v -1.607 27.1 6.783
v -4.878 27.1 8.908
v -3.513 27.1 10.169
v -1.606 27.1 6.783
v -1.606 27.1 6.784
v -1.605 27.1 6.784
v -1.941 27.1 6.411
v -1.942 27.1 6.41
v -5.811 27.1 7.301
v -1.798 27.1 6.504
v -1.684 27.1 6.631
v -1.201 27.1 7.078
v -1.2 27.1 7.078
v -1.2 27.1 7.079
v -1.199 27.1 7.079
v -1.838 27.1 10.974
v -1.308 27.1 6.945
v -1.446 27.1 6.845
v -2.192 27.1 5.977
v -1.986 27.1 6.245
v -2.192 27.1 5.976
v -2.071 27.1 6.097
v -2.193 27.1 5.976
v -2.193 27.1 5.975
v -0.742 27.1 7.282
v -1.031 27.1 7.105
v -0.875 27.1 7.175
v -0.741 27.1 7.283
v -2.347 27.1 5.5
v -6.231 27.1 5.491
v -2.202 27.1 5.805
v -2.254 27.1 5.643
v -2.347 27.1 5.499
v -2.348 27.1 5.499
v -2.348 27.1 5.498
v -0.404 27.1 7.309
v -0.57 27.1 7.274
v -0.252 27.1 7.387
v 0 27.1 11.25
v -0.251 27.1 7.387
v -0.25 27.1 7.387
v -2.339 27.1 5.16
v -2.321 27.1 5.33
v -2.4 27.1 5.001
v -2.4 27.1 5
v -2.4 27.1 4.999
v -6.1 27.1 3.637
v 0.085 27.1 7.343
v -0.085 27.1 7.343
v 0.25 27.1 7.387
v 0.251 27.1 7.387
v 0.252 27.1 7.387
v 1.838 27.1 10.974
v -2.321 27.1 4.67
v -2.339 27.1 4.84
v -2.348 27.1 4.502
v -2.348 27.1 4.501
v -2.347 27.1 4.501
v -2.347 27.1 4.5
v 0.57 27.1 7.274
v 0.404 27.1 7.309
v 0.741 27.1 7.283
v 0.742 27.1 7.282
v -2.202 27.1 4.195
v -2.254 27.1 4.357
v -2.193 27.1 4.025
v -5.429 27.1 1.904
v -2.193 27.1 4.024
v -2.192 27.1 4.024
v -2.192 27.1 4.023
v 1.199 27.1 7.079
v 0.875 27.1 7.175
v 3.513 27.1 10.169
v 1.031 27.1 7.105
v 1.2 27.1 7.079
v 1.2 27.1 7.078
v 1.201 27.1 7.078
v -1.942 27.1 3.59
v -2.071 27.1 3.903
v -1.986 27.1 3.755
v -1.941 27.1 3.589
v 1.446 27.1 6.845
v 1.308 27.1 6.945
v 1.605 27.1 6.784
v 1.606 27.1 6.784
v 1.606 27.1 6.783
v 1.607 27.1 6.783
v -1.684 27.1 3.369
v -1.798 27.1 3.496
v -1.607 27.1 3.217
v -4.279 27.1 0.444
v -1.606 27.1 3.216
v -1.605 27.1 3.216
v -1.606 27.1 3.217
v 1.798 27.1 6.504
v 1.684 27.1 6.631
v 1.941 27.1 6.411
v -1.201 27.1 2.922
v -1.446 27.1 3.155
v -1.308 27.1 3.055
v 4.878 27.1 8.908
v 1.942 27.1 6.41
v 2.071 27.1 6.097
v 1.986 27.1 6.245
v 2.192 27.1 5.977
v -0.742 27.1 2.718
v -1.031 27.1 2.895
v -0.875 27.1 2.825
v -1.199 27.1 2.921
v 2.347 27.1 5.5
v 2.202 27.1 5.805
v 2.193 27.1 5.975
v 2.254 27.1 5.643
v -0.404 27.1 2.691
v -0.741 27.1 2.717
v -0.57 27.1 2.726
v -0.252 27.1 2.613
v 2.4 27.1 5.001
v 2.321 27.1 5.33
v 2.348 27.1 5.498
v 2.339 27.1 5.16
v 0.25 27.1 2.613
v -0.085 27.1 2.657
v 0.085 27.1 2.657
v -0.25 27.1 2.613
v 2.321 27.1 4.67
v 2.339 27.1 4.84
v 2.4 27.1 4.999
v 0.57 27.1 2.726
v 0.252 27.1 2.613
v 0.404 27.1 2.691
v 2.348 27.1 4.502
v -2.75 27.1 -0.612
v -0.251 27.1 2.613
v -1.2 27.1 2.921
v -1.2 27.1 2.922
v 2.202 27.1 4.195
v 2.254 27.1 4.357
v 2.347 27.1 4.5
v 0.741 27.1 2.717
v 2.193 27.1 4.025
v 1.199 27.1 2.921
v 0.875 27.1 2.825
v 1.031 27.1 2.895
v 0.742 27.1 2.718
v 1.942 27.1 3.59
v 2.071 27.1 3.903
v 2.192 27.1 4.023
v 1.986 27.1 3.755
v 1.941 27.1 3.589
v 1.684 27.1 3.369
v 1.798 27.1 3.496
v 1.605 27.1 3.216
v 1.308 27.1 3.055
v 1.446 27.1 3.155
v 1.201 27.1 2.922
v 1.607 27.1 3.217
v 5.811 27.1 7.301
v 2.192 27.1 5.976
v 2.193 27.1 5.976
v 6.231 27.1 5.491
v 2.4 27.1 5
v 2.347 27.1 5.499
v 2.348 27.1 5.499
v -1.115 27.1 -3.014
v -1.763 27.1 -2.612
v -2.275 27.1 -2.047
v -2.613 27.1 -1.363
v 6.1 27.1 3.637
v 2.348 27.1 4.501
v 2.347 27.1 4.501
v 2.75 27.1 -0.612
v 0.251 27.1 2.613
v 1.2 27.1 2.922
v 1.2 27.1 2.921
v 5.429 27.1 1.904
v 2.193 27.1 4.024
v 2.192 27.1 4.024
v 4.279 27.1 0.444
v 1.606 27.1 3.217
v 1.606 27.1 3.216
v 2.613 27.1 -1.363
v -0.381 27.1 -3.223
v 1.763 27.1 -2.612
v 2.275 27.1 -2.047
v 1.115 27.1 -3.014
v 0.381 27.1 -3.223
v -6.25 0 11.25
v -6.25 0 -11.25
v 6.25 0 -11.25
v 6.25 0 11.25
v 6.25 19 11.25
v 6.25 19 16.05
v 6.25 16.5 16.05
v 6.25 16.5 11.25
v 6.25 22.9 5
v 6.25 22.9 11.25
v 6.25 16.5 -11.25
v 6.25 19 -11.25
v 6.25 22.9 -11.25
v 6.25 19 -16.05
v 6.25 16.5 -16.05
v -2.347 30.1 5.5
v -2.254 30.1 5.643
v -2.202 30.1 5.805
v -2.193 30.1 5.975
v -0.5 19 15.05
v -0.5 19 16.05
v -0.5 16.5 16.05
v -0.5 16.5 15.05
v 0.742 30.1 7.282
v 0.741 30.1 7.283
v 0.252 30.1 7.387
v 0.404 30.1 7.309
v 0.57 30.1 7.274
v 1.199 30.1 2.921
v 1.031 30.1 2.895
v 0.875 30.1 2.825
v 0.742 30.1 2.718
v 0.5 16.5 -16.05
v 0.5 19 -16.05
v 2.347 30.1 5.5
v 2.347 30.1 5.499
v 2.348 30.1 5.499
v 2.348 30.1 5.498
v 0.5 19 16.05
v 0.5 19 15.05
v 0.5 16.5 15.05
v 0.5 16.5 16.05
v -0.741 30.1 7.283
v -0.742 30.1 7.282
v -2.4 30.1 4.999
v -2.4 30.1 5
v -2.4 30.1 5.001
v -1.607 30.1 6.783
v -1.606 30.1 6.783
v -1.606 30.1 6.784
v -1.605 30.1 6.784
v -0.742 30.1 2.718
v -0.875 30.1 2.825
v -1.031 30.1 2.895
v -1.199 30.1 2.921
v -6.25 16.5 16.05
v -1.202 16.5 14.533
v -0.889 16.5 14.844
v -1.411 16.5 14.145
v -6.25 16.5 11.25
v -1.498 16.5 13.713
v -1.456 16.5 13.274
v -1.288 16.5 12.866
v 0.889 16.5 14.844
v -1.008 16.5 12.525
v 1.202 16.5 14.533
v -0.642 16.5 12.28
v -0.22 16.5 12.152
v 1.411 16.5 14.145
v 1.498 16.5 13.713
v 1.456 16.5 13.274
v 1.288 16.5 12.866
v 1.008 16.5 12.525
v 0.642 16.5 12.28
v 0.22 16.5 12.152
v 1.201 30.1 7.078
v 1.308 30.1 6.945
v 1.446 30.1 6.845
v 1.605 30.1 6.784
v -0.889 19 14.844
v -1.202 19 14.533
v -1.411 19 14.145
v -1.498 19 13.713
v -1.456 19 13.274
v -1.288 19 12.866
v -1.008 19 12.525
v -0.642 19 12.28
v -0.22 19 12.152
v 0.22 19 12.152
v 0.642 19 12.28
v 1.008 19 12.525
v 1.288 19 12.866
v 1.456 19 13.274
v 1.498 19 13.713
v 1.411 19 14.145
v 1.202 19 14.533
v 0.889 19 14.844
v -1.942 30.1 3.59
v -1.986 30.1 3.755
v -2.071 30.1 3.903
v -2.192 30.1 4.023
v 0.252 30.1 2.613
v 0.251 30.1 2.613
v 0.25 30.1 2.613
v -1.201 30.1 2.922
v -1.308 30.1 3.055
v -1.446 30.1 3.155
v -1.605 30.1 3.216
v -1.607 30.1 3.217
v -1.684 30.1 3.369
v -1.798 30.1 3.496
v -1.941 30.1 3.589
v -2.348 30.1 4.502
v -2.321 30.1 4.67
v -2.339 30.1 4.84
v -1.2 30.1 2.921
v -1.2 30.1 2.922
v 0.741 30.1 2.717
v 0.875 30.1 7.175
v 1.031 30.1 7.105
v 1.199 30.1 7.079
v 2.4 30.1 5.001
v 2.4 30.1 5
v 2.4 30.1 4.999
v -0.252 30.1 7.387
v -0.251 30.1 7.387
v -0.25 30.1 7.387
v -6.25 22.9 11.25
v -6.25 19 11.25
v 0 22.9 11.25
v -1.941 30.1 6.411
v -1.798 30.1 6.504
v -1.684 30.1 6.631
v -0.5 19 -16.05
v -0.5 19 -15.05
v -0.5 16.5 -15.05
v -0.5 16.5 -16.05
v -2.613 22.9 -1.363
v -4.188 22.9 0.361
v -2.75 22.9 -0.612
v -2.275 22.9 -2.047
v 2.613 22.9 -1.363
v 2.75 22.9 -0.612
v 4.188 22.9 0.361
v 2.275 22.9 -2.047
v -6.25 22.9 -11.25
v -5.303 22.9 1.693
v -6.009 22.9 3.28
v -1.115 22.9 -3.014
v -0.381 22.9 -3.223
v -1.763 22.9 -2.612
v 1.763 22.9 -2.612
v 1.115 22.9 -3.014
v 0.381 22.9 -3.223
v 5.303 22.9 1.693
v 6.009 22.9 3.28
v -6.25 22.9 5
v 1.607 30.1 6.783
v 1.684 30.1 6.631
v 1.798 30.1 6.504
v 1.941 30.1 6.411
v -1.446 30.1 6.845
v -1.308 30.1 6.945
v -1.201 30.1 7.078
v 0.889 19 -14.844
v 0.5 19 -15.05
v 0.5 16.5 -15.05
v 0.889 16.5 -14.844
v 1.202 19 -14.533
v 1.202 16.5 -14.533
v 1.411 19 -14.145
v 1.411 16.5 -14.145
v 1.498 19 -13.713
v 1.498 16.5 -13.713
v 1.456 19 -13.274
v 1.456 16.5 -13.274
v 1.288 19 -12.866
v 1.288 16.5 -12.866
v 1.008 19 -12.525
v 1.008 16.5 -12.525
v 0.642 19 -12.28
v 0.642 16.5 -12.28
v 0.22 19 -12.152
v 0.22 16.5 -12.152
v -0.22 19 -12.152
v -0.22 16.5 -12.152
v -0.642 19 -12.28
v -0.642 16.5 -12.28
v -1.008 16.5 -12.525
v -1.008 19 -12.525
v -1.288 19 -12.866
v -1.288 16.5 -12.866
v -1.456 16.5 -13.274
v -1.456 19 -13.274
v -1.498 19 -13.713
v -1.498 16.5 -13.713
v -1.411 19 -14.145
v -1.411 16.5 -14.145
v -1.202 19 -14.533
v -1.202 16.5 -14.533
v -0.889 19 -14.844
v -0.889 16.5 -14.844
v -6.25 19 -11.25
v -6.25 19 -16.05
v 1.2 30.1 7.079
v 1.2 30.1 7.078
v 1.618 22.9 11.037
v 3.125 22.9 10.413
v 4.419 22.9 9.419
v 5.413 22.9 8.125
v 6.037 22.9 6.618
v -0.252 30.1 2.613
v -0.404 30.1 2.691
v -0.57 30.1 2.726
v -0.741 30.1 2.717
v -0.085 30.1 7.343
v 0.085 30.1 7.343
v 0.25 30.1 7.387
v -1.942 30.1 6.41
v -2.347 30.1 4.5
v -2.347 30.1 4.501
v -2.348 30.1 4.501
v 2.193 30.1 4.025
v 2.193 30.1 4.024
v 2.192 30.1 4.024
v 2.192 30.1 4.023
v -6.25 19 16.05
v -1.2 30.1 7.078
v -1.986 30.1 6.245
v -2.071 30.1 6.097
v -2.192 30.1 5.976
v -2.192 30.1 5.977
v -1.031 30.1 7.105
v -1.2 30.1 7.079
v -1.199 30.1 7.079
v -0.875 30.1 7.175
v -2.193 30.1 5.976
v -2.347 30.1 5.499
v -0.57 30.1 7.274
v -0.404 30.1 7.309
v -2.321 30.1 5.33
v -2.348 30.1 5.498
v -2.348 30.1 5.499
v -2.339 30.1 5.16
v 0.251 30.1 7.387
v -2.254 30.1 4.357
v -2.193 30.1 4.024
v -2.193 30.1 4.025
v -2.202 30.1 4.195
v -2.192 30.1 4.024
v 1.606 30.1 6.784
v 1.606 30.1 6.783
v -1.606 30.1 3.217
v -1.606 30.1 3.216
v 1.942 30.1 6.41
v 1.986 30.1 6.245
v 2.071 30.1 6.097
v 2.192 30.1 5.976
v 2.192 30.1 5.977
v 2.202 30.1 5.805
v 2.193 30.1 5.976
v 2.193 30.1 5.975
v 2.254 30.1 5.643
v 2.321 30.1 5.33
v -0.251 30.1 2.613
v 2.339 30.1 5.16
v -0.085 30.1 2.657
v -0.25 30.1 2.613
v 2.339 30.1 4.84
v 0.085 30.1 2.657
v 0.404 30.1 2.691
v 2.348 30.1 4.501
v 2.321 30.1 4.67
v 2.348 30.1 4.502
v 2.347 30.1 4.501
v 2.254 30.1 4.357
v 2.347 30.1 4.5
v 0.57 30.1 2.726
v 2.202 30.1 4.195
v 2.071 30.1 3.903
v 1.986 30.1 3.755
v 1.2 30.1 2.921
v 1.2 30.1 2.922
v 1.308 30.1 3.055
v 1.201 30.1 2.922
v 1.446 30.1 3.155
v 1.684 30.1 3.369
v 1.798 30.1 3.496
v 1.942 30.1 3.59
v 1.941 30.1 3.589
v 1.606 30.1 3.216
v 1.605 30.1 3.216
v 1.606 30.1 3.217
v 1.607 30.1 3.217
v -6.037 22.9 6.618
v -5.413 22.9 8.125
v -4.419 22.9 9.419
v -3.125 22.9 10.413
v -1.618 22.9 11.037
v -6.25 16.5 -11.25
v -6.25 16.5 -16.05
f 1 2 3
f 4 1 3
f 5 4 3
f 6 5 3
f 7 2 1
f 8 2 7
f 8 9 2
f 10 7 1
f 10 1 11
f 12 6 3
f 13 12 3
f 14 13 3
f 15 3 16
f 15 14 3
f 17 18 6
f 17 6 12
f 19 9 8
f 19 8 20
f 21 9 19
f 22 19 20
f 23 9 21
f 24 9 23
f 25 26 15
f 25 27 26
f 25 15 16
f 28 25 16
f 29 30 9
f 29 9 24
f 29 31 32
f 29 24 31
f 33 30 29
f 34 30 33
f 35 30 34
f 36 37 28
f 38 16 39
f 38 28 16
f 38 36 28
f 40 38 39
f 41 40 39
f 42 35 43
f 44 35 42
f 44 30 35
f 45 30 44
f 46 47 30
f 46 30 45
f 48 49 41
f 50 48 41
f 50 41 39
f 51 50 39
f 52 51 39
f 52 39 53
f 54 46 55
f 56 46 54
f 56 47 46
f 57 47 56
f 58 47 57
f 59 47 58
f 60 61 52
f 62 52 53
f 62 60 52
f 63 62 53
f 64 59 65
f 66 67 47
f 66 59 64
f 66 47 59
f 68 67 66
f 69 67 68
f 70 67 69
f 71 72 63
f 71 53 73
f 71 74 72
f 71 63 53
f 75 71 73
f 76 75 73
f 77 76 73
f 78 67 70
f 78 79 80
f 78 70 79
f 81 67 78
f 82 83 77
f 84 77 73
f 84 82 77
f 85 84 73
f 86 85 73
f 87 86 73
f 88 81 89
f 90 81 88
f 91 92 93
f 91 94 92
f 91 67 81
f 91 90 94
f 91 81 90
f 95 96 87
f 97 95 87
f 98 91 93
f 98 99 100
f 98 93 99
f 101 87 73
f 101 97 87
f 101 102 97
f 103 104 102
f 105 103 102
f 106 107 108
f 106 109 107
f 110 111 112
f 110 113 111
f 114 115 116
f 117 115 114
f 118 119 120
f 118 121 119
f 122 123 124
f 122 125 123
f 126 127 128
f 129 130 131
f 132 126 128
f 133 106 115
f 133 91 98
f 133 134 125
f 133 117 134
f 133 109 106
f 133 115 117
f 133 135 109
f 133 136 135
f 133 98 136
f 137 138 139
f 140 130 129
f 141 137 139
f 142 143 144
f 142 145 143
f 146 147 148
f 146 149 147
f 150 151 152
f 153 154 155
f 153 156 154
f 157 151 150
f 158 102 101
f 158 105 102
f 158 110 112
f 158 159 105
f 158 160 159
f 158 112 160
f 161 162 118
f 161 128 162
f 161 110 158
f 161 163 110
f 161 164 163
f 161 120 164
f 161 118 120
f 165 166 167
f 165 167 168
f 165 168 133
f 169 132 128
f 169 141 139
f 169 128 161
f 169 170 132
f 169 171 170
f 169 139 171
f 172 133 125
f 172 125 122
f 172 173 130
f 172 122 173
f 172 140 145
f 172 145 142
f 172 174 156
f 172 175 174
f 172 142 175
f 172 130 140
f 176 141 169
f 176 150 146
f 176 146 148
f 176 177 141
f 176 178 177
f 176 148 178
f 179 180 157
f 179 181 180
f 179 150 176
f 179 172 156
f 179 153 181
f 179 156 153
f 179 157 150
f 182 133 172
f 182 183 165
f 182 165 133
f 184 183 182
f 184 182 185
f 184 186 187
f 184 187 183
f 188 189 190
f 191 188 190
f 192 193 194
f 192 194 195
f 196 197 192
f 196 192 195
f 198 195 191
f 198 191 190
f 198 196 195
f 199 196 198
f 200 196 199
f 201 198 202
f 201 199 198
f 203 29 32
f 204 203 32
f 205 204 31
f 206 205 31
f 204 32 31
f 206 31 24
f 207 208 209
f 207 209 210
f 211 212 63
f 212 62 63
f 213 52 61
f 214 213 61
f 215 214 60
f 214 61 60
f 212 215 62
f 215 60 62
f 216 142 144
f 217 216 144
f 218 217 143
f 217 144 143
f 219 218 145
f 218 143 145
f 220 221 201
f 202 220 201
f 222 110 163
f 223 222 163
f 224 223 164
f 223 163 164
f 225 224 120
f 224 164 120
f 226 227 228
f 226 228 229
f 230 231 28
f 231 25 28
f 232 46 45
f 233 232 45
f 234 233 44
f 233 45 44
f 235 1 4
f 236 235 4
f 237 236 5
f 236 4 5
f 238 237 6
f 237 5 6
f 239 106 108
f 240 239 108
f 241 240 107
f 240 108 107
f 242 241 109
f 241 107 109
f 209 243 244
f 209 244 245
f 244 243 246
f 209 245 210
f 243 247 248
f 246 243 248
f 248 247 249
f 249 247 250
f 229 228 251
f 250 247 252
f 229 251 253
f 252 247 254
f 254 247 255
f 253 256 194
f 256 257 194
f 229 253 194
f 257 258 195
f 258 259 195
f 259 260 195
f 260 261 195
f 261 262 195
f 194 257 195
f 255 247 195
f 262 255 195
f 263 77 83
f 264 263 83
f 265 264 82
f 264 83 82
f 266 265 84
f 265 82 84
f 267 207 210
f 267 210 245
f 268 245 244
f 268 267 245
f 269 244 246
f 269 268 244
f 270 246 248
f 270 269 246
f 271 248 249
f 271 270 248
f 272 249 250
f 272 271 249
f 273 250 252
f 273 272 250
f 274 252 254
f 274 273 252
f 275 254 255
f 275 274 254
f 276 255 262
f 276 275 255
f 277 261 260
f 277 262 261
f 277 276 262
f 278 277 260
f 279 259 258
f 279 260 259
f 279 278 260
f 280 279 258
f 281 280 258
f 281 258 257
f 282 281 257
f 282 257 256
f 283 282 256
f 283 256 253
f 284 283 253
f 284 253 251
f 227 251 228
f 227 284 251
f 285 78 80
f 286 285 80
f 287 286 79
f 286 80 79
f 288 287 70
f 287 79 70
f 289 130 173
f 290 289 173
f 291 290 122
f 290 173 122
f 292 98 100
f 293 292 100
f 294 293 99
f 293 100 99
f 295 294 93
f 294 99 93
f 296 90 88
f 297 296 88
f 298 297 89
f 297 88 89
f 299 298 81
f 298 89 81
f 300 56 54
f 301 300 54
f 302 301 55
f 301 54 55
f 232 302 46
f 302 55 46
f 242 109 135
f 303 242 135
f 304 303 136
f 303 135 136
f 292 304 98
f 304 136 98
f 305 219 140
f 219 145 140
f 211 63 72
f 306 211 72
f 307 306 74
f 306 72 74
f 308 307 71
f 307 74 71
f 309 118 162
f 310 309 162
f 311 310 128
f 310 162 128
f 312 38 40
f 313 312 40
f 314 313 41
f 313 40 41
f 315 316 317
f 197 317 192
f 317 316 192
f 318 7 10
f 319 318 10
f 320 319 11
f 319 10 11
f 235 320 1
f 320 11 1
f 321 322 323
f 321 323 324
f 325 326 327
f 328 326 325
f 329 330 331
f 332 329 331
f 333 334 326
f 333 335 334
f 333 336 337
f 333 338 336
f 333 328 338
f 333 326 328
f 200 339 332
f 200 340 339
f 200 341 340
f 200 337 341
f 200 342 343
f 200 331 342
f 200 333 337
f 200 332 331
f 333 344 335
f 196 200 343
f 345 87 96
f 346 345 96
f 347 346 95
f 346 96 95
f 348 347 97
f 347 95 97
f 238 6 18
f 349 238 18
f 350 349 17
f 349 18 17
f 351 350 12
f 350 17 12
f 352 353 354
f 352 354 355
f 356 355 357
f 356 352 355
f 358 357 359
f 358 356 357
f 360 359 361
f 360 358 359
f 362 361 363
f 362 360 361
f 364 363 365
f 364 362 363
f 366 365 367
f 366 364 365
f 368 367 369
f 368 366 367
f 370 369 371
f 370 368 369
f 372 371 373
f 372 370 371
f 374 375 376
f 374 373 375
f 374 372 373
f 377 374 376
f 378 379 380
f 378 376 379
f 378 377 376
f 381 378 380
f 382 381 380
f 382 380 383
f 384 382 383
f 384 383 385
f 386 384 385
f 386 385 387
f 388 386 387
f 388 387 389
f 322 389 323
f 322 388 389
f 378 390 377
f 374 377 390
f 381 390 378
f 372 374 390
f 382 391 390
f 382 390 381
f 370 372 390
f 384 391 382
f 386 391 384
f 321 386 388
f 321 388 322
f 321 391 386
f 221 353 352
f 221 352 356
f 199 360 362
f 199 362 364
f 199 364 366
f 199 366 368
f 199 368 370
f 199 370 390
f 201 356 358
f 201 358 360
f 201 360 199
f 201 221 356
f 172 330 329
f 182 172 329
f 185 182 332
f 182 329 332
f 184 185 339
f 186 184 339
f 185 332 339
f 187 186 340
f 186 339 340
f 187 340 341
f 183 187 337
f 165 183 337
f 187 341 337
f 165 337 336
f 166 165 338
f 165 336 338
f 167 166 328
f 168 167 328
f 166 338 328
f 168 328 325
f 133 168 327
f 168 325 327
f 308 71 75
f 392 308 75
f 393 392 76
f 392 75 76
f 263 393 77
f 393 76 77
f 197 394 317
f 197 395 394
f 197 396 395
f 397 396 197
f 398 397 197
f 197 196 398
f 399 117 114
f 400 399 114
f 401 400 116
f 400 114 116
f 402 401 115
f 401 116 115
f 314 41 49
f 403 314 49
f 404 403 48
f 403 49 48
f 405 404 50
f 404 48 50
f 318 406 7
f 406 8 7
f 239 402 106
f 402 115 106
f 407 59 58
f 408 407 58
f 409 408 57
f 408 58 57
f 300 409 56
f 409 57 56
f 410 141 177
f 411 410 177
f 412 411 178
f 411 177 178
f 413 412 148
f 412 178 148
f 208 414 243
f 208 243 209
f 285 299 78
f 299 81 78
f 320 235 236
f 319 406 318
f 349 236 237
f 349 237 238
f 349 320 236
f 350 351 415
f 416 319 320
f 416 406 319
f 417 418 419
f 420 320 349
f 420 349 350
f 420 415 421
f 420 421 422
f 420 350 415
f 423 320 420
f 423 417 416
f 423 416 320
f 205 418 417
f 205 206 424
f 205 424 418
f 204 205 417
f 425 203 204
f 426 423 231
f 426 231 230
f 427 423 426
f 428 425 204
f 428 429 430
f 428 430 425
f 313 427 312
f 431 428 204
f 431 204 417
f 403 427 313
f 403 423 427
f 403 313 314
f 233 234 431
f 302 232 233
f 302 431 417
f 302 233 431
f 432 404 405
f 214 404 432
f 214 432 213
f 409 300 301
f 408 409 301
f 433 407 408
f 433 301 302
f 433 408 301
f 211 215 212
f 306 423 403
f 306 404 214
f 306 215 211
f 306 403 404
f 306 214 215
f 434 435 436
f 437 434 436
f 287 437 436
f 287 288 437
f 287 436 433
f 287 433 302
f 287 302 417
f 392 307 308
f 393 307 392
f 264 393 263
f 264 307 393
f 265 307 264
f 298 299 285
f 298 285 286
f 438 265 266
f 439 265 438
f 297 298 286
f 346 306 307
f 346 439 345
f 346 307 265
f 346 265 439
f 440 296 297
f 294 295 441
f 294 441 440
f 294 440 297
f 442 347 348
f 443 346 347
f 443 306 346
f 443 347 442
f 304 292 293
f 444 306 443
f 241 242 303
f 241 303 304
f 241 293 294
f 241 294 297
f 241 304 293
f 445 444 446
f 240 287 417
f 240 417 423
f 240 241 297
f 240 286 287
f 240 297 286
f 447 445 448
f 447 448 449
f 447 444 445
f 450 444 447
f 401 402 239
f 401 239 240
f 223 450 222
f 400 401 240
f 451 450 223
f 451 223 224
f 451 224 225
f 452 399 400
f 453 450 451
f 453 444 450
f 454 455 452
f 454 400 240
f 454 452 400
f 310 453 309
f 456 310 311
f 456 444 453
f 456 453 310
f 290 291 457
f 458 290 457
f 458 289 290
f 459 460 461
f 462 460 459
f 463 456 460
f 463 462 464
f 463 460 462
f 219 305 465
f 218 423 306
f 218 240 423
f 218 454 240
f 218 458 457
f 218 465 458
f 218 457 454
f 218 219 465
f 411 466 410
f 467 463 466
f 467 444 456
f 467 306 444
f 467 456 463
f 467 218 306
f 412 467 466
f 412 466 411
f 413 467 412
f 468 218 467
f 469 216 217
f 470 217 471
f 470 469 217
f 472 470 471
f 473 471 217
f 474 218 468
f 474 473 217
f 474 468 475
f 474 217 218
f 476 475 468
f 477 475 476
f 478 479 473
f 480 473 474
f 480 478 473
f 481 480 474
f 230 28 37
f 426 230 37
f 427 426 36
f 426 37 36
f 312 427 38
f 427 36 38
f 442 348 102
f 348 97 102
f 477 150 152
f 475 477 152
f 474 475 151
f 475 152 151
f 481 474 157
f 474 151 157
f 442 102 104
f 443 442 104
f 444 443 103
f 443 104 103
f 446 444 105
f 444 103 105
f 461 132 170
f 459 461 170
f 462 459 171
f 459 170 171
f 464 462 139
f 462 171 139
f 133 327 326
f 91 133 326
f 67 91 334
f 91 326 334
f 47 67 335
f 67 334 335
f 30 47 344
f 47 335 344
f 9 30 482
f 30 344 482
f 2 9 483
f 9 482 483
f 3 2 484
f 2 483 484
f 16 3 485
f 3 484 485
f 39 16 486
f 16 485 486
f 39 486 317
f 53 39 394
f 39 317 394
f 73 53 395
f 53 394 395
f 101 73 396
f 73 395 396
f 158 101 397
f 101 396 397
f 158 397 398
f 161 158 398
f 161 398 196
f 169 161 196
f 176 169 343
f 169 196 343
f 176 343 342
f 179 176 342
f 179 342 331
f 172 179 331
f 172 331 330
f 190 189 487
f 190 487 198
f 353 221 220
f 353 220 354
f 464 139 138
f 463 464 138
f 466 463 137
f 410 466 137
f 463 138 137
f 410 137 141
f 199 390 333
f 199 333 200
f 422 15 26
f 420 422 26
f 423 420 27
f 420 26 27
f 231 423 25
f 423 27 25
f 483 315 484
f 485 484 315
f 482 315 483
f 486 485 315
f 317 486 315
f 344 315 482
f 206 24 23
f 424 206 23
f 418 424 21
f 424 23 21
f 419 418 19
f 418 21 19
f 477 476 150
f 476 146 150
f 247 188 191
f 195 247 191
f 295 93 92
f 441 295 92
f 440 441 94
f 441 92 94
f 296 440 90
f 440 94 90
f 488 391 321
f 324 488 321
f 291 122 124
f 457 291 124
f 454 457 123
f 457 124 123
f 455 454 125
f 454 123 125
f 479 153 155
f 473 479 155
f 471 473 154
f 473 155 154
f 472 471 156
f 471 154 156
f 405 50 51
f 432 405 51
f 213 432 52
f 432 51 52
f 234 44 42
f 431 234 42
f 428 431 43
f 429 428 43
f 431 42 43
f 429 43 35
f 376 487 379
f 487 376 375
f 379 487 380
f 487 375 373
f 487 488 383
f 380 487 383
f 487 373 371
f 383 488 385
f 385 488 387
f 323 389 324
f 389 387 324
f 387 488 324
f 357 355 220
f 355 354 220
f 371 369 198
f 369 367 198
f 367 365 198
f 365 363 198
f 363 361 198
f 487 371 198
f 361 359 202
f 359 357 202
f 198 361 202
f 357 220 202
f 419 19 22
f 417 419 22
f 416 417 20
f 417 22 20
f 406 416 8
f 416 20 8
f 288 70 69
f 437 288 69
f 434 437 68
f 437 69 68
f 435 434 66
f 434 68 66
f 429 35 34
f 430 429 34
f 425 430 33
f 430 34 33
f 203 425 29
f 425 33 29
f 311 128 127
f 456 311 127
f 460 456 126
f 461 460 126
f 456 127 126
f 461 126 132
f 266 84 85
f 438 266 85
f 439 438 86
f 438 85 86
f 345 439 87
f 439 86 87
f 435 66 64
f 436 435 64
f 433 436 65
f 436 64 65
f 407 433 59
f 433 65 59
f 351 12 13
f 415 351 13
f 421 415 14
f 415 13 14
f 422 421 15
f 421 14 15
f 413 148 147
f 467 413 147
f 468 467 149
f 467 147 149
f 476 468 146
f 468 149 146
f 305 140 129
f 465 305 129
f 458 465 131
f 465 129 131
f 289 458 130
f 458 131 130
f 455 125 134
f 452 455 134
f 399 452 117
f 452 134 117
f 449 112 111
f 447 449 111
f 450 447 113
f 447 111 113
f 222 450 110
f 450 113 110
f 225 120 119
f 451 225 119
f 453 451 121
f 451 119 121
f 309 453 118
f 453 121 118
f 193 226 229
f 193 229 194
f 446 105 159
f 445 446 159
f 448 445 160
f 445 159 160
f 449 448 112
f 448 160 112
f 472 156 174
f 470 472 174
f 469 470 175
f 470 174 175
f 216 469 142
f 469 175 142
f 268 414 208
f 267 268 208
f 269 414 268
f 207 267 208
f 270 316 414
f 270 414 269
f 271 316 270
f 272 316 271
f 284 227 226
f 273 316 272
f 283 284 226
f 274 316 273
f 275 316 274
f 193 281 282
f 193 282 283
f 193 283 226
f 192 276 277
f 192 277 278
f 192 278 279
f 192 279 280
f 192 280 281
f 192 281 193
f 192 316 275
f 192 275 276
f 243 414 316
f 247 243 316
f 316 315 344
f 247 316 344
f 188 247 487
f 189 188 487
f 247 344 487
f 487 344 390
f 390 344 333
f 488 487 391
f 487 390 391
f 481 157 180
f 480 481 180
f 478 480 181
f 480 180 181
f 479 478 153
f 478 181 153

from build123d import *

# Parameters (mm, degrees)
SKETCH1_W           = 12.5
SKETCH1_H           = 22.5
BOSS_EXTRUDE1_DEPTH = 19
SKETCH2_W           = 12.5
SKETCH2_H           = 32.1
BOSS_EXTRUDE2_DEPTH = 2.5
SKETCH3_W           = 12.5
SKETCH3_H           = 22.5
BOSS_EXTRUDE3_DEPTH = 3.9
BOSS_EXTRUDE4_DEPTH = 4.2
BOSS_EXTRUDE5_DEPTH = 3
CUT_EXTRUDE1_DEPTH  = 20


with BuildPart() as part:
    # Sketch1 → Boss-Extrude1 (new body)
    with BuildSketch(Plane(origin=(0, 0, 0), x_dir=(1, 0, 0), z_dir=(0, 1, 0))):
        Rectangle(SKETCH1_W, SKETCH1_H)
    extrude(amount=BOSS_EXTRUDE1_DEPTH)

    # Sketch2 → Boss-Extrude2 (add)
    with BuildSketch(Plane(origin=(0, 19, 0), x_dir=(1, 0, 0), z_dir=(0, 1, 0))):
        Rectangle(SKETCH2_W, SKETCH2_H)
    extrude(amount=-BOSS_EXTRUDE2_DEPTH)

    # Sketch3 → Boss-Extrude3 (add)
    with BuildSketch(Plane(origin=(0, 19, 0), x_dir=(1, 0, 0), z_dir=(0, 1, 0))):
        Rectangle(SKETCH3_W, SKETCH3_H)
    extrude(amount=BOSS_EXTRUDE3_DEPTH)

    # Sketch4 → Boss-Extrude4 (add)
    with BuildSketch(Plane(origin=(0, 22.9, 0), x_dir=(1, 0, 0), z_dir=(0, 1, 0))):
        with BuildLine():
            ThreePointArc((-2.75, 0.61248608), (0, -11.25), (2.75, 0.61248608))
            ThreePointArc((2.75, 0.61248608), (0, 3.25), (-2.75, 0.61248608))
        make_face()
    extrude(amount=BOSS_EXTRUDE4_DEPTH)

    # Sketch5 → Boss-Extrude5 (add)
    with BuildSketch(Plane(origin=(0, 27.1, 0), x_dir=(1, 0, 0), z_dir=(0, 1, 0))):
        with BuildLine():
            ThreePointArc((-0.25, -2.613056348), (-0.250868312, -2.613147451), (-0.25173659, -2.613238871))
            ThreePointArc((-0.25173659, -2.613238871), (-0.485877906, -2.714124173), (-0.740810391, -2.717194716))
            ThreePointArc((-0.740810391, -2.717194716), (-0.741640786, -2.717464361), (-0.742471084, -2.717734308))
            ThreePointArc((-0.742471084, -2.717734308), (-0.950520616, -2.865095742), (-1.199243813, -2.921102629))
            ThreePointArc((-1.199243813, -2.921102629), (-1.2, -2.921539031), (-1.200756028, -2.921975707))
            ThreePointArc((-1.200756028, -2.921975707), (-1.373621014, -3.10937287), (-1.605264526, -3.215868334))
            ThreePointArc((-1.605264526, -3.215868334), (-1.605913455, -3.216452419), (-1.606562172, -3.21703674))
            ThreePointArc((-1.606562172, -3.21703674), (-1.736687583, -3.436279477), (-1.941127476, -3.588609153))
            ThreePointArc((-1.941127476, -3.588609153), (-1.941640786, -3.589315394), (-1.94215384, -3.590021823))
            ThreePointArc((-1.94215384, -3.590021823), (-2.02385257, -3.831528174), (-2.19215384, -4.023034525))
            ThreePointArc((-2.19215384, -4.023034525), (-2.192509098, -4.023832057), (-2.192864066, -4.024629718))
            ThreePointArc((-2.192864066, -4.024629718), (-2.222565489, -4.277844696), (-2.347372563, -4.500157976))
            ThreePointArc((-2.347372563, -4.500157976), (-2.347554242, -4.501011942), (-2.34773561, -4.501865974))
            ThreePointArc((-2.34773561, -4.501865974), (-2.324141631, -4.755722871), (-2.399999841, -4.999126922))
            ThreePointArc((-2.399999841, -4.999126922), (-2.4, -5), (-2.399999841, -5.000873078))
            ThreePointArc((-2.399999841, -5.000873078), (-2.324141631, -5.244277129), (-2.34773561, -5.498134026))
            ThreePointArc((-2.34773561, -5.498134026), (-2.347554242, -5.498988058), (-2.347372563, -5.499842024))
            ThreePointArc((-2.347372563, -5.499842024), (-2.222565489, -5.722155304), (-2.192864066, -5.975370282))
            ThreePointArc((-2.192864066, -5.975370282), (-2.192509098, -5.976167943), (-2.19215384, -5.976965475))
            ThreePointArc((-2.19215384, -5.976965475), (-2.02385257, -6.168471826), (-1.94215384, -6.409978177))
            ThreePointArc((-1.94215384, -6.409978177), (-1.941640786, -6.410684606), (-1.941127476, -6.411390847))
            ThreePointArc((-1.941127476, -6.411390847), (-1.736687583, -6.563720523), (-1.606562172, -6.78296326))
            ThreePointArc((-1.606562172, -6.78296326), (-1.605913455, -6.783547581), (-1.605264526, -6.784131666))
            ThreePointArc((-1.605264526, -6.784131666), (-1.373621014, -6.89062713), (-1.200756028, -7.078024293))
            ThreePointArc((-1.200756028, -7.078024293), (-1.2, -7.078460969), (-1.199243813, -7.078897371))
            ThreePointArc((-1.199243813, -7.078897371), (-0.950520616, -7.134904258), (-0.742471084, -7.282265692))
            ThreePointArc((-0.742471084, -7.282265692), (-0.741640786, -7.282535639), (-0.740810391, -7.282805284))
            ThreePointArc((-0.740810391, -7.282805284), (-0.485877906, -7.285875827), (-0.25173659, -7.386761129))
            ThreePointArc((-0.25173659, -7.386761129), (-0.250868312, -7.386852549), (-0.25, -7.386943652))
            ThreePointArc((-0.25, -7.386943652), (0, -7.336943652), (0.25, -7.386943652))
            ThreePointArc((0.25, -7.386943652), (0.250868312, -7.386852549), (0.25173659, -7.386761129))
            ThreePointArc((0.25173659, -7.386761129), (0.485877906, -7.285875827), (0.740810391, -7.282805284))
            ThreePointArc((0.740810391, -7.282805284), (0.741640786, -7.282535639), (0.742471084, -7.282265692))
            ThreePointArc((0.742471084, -7.282265692), (0.950520616, -7.134904258), (1.199243813, -7.078897371))
            ThreePointArc((1.199243813, -7.078897371), (1.2, -7.078460969), (1.200756028, -7.078024293))
            ThreePointArc((1.200756028, -7.078024293), (1.373621014, -6.89062713), (1.605264526, -6.784131666))
            ThreePointArc((1.605264526, -6.784131666), (1.605913455, -6.783547581), (1.606562172, -6.78296326))
            ThreePointArc((1.606562172, -6.78296326), (1.736687583, -6.563720523), (1.941127476, -6.411390847))
            ThreePointArc((1.941127476, -6.411390847), (1.941640786, -6.410684606), (1.94215384, -6.409978177))
            ThreePointArc((1.94215384, -6.409978177), (2.02385257, -6.168471826), (2.19215384, -5.976965475))
            ThreePointArc((2.19215384, -5.976965475), (2.192509098, -5.976167943), (2.192864066, -5.975370282))
            ThreePointArc((2.192864066, -5.975370282), (2.222565489, -5.722155304), (2.347372563, -5.499842024))
            ThreePointArc((2.347372563, -5.499842024), (2.347554242, -5.498988058), (2.34773561, -5.498134026))
            ThreePointArc((2.34773561, -5.498134026), (2.324141631, -5.244277129), (2.399999841, -5.000873078))
            ThreePointArc((2.399999841, -5.000873078), (2.4, -5), (2.399999841, -4.999126922))
            ThreePointArc((2.399999841, -4.999126922), (2.324141631, -4.755722871), (2.34773561, -4.501865974))
            ThreePointArc((2.34773561, -4.501865974), (2.347554242, -4.501011942), (2.347372563, -4.500157976))
            ThreePointArc((2.347372563, -4.500157976), (2.222565489, -4.277844696), (2.192864066, -4.024629718))
            ThreePointArc((2.192864066, -4.024629718), (2.192509098, -4.023832057), (2.19215384, -4.023034525))
            ThreePointArc((2.19215384, -4.023034525), (2.02385257, -3.831528174), (1.94215384, -3.590021823))
            ThreePointArc((1.94215384, -3.590021823), (1.941640786, -3.589315394), (1.941127476, -3.588609153))
            ThreePointArc((1.941127476, -3.588609153), (1.736687583, -3.436279477), (1.606562172, -3.21703674))
            ThreePointArc((1.606562172, -3.21703674), (1.605913455, -3.216452419), (1.605264526, -3.215868334))
            ThreePointArc((1.605264526, -3.215868334), (1.373621014, -3.10937287), (1.200756028, -2.921975707))
            ThreePointArc((1.200756028, -2.921975707), (1.2, -2.921539031), (1.199243813, -2.921102629))
            ThreePointArc((1.199243813, -2.921102629), (0.950520616, -2.865095742), (0.742471084, -2.717734308))
            ThreePointArc((0.742471084, -2.717734308), (0.741640786, -2.717464361), (0.740810391, -2.717194716))
            ThreePointArc((0.740810391, -2.717194716), (0.485877906, -2.714124173), (0.25173659, -2.613238871))
            ThreePointArc((0.25173659, -2.613238871), (0.250868312, -2.613147451), (0.25, -2.613056348))
            ThreePointArc((0.25, -2.613056348), (0, -2.663056348), (-0.25, -2.613056348))
        make_face()
    extrude(amount=BOSS_EXTRUDE5_DEPTH)

    # Sketch6 → Cut-Extrude1 (cut, through all)
    with BuildSketch(Plane(origin=(0, 19, 0), x_dir=(1, 0, 0), z_dir=(0, 1, 0))):
        with BuildLine():
            Line((0.5, 16.05), (0.5, 15.05))
            ThreePointArc((0.5, 15.05), (0, 12.135786438), (-0.5, 15.05))
            Line((-0.5, 15.05), (-0.5, 16.05))
            Line((-0.5, 16.05), (0.5, 16.05))
        make_face()
        with BuildLine():
            Line((-0.5, -16.05), (-0.5, -15.05))
            ThreePointArc((-0.5, -15.05), (0, -12.135786438), (0.5, -15.05))
            Line((0.5, -15.05), (0.5, -16.05))
            Line((0.5, -16.05), (-0.5, -16.05))
        make_face()
    extrude(amount=-CUT_EXTRUDE1_DEPTH, mode=Mode.SUBTRACT)


solid = part.part
